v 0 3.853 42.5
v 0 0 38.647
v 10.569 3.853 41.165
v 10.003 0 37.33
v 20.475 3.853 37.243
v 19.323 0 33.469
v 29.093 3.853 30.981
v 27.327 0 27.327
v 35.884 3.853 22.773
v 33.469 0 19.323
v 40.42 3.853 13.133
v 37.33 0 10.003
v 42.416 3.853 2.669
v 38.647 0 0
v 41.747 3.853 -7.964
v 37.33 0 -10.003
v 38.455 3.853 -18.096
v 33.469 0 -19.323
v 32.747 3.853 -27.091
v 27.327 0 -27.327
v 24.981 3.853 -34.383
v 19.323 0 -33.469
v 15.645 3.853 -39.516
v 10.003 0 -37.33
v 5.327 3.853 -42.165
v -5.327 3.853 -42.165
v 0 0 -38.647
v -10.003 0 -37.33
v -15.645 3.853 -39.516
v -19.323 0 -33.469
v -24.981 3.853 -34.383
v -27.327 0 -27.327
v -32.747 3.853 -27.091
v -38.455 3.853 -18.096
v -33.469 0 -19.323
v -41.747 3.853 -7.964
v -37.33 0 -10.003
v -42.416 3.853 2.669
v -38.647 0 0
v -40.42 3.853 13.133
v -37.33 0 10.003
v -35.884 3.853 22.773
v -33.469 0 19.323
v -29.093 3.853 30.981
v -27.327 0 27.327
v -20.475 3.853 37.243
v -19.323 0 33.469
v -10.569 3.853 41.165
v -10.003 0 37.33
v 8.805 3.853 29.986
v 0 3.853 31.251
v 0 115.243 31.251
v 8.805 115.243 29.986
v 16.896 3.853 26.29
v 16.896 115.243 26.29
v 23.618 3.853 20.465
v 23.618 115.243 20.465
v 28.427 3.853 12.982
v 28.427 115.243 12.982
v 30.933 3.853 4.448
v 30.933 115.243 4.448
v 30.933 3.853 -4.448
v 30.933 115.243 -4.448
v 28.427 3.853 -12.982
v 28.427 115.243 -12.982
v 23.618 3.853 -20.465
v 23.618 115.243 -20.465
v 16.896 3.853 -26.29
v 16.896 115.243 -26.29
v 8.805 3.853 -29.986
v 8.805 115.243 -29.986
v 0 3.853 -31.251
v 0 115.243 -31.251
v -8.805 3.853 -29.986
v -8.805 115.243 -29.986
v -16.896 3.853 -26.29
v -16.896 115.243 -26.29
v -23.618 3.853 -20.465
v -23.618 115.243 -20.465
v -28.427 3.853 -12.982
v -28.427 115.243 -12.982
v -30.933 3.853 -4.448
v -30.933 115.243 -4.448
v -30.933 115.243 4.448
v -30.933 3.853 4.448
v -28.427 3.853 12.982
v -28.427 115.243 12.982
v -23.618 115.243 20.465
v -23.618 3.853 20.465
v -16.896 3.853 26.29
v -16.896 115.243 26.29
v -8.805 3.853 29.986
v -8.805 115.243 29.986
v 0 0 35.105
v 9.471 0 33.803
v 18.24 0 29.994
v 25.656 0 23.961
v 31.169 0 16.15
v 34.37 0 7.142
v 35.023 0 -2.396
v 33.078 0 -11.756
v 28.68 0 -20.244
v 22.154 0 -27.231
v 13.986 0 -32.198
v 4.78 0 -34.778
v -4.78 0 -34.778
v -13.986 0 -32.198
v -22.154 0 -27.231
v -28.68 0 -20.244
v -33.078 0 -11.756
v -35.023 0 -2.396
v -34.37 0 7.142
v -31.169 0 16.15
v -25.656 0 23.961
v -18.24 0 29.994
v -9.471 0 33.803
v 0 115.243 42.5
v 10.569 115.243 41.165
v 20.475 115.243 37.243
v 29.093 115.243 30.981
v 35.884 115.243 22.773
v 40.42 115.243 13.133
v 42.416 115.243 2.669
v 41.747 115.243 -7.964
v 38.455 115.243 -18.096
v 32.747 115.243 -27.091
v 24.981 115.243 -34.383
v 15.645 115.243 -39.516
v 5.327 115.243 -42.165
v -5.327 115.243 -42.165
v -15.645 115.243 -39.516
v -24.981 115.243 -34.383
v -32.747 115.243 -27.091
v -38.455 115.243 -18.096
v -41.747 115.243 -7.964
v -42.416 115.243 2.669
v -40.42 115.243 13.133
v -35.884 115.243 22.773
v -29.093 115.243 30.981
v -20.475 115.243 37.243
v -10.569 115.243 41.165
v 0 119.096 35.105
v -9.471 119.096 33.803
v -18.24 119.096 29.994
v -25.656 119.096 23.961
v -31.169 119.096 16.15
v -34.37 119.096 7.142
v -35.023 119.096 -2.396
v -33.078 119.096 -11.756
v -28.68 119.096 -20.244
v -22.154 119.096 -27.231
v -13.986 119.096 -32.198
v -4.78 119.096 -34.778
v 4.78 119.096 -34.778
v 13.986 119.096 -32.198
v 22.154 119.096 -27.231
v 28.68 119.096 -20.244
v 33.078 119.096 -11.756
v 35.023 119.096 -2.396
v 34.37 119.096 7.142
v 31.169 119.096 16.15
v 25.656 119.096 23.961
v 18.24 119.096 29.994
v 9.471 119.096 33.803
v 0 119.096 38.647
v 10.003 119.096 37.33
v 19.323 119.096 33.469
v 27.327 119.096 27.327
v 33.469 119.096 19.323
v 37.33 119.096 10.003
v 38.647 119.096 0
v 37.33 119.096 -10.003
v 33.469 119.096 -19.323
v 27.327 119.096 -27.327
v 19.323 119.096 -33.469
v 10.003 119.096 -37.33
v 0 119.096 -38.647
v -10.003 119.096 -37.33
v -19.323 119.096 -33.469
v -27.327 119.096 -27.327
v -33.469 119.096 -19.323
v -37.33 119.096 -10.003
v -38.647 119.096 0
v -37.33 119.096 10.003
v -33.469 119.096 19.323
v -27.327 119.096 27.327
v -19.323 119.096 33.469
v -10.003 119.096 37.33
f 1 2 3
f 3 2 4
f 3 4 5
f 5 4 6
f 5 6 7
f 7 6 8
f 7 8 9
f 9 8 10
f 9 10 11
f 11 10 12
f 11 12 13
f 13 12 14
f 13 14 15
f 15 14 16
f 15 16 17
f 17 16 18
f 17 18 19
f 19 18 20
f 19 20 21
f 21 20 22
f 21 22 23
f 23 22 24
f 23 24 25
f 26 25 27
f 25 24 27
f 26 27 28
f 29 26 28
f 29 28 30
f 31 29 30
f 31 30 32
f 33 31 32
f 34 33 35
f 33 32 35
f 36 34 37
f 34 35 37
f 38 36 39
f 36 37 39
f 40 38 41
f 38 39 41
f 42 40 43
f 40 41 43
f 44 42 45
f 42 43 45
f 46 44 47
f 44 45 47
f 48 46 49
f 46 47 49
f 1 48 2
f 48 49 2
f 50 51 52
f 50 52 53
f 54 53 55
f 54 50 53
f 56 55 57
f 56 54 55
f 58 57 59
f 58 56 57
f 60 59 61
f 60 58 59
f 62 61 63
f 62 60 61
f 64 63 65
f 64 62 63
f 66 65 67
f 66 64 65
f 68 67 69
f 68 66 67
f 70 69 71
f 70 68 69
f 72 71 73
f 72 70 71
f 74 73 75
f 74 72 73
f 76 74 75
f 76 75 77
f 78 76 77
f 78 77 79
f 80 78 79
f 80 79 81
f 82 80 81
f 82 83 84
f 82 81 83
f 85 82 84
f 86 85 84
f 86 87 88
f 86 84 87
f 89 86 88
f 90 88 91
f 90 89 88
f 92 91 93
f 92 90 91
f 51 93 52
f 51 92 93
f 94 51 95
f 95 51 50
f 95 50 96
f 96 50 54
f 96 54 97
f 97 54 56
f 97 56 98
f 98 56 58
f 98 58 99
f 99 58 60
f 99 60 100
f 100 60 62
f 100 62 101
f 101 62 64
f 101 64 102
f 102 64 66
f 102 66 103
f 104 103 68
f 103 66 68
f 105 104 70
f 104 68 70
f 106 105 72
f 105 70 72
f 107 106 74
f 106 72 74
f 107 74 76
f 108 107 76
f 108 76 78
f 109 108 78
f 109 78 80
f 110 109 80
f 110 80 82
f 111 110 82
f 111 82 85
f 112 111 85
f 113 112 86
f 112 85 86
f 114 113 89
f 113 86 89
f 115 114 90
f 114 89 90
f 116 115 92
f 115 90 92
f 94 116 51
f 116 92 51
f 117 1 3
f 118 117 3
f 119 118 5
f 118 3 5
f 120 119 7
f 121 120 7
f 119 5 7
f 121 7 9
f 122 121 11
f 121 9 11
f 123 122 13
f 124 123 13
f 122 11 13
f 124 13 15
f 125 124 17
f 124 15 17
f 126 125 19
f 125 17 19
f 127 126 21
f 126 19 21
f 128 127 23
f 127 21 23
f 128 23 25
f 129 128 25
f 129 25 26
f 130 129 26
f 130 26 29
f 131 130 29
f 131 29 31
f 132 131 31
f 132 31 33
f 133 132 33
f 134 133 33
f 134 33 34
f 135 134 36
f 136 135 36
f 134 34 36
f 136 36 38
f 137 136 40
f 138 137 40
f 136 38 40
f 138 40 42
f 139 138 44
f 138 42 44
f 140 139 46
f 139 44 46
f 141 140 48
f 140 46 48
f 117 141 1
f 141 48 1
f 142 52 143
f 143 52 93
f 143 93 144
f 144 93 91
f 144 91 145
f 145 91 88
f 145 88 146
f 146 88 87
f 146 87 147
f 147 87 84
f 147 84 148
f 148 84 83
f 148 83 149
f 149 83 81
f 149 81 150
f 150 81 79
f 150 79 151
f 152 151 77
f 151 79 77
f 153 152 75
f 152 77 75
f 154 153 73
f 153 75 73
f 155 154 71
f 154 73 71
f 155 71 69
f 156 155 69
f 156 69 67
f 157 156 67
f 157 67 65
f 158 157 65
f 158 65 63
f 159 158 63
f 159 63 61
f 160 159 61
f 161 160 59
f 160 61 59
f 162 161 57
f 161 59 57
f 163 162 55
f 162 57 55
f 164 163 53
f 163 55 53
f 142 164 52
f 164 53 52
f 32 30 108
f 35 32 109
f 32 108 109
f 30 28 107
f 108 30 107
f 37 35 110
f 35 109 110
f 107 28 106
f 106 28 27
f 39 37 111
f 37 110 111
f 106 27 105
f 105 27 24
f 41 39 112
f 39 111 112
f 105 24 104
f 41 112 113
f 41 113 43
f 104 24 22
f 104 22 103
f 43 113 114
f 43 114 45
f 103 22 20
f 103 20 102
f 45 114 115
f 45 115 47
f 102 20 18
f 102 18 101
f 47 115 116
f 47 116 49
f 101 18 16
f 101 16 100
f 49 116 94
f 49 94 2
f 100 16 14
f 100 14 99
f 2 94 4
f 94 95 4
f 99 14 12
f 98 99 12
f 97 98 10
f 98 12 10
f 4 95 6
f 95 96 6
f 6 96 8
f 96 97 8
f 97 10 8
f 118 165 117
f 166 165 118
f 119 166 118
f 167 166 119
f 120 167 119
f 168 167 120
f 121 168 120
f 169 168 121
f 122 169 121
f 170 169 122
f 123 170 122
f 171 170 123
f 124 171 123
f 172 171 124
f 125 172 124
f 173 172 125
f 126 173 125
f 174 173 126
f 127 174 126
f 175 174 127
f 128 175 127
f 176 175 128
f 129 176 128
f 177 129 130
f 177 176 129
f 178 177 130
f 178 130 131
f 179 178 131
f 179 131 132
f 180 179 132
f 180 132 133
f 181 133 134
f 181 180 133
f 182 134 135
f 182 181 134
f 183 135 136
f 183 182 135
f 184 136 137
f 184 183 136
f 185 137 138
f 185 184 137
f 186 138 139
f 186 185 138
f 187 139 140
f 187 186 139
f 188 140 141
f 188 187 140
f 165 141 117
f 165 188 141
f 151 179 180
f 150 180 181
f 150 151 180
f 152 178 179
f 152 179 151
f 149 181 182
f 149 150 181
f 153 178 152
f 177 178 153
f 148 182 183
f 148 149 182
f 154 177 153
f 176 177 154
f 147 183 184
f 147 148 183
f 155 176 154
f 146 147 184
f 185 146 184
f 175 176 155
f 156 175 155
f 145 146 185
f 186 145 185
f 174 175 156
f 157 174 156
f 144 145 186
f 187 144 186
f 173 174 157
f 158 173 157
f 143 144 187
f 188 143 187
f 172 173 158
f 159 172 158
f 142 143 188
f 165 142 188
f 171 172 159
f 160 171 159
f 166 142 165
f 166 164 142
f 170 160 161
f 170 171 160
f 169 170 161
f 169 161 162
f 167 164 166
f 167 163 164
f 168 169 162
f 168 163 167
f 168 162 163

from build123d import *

# Parameters (mm, degrees)
SKETCH1_R           = 42.5
BOSS_EXTRUDE1_DEPTH = 119.096016081
SKETCH2_R           = 31.251455777
CUT_EXTRUDE1_DEPTH  = 134.403002389
CHAMFER1_SIZE       = 3.853268379


with BuildPart() as part:
    # Sketch1 → Boss-Extrude1 (new body)
    with BuildSketch(Plane(origin=(0, 0, 0), x_dir=(1, 0, 0), z_dir=(0, 1, 0))):
        Circle(SKETCH1_R)
    extrude(amount=BOSS_EXTRUDE1_DEPTH)

    # Sketch2 → Cut-Extrude1 (cut, through all)
    with BuildSketch(Plane(origin=(0, 0, 0), x_dir=(1, 0, 0), z_dir=(0, 1, 0))):
        Circle(SKETCH2_R)
    extrude(amount=CUT_EXTRUDE1_DEPTH, mode=Mode.SUBTRACT)

    # Chamfer1
    chamfer1_edges = [part.edges().sort_by_distance(p)[0] for p in [
        (-31.251455777, 119.096016081, 0),
        (-31.251455777, 0, 0),
        (-42.5, 0, 0),
        (-42.5, 119.096016081, 0),
    ]]
    chamfer(chamfer1_edges, length=CHAMFER1_SIZE)


solid = part.part
